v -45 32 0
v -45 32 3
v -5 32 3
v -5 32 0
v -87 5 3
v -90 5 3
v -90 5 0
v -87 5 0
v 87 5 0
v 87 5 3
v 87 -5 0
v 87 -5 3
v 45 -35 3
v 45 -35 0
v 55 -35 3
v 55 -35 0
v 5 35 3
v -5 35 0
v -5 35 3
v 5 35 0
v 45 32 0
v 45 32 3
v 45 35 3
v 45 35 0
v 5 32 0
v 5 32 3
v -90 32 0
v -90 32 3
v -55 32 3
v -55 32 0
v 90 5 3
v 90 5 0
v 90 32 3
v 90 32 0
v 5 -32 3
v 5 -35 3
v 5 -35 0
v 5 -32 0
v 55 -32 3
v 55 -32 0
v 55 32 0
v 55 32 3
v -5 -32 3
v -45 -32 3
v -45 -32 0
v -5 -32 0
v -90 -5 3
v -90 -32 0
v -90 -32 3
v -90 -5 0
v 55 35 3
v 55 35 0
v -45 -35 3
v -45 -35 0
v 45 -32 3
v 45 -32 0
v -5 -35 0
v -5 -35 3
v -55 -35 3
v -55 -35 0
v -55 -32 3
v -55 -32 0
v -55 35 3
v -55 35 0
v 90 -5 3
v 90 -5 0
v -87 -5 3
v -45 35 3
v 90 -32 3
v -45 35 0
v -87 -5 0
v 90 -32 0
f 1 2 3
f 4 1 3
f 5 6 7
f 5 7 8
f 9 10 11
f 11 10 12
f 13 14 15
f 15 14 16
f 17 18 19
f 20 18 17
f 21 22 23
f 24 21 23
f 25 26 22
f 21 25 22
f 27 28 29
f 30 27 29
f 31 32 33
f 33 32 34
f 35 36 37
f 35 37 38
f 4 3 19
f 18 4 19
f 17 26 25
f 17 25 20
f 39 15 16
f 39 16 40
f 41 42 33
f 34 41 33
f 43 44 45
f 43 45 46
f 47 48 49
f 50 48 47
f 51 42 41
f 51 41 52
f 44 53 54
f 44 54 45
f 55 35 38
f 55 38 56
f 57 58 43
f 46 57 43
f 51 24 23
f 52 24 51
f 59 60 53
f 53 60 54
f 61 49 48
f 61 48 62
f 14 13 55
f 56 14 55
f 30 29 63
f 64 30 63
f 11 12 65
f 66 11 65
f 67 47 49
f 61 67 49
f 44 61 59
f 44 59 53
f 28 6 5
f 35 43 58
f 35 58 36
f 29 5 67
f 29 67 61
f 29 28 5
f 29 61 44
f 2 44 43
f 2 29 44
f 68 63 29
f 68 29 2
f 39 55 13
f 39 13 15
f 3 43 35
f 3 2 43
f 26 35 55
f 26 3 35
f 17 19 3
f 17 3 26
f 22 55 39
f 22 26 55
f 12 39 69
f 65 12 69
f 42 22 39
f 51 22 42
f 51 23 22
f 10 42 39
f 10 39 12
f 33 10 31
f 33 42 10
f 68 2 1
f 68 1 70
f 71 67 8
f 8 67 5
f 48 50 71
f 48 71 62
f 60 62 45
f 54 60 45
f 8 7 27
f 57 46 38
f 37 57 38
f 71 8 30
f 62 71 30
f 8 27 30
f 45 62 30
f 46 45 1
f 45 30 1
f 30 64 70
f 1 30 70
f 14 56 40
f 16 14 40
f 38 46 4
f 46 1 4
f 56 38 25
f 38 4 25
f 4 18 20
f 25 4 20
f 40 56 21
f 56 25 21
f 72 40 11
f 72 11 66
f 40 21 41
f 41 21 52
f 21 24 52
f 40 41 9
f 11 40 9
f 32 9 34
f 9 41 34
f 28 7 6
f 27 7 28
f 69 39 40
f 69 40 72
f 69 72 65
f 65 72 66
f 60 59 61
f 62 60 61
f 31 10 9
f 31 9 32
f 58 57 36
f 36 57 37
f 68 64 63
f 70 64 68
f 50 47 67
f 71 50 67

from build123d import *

# Parameters (mm, degrees)
SKETCH3_W           = 180
SKETCH3_H           = 70
BOSS_EXTRUDE1_DEPTH = 3
SKETCH5_W           = 3
SKETCH5_H           = 5
CUT_EXTRUDE2_DEPTH  = 3
SKETCH4_W           = 35
SKETCH4_H           = 3
SKETCH4_W_2         = 40
CUT_EXTRUDE3_DEPTH  = 10


with BuildPart() as part:
    # Sketch3 → Boss-Extrude1 (new body)
    with BuildSketch(Plane.XY):
        Rectangle(SKETCH3_W, SKETCH3_H)
    extrude(amount=BOSS_EXTRUDE1_DEPTH)

    # Sketch5 → Cut-Extrude2 (cut)
    with BuildSketch(Plane.XY.offset(3)):
        with Locations((-88.5, 2.5)):
            Rectangle(SKETCH5_W, SKETCH5_H)
        with Locations((-88.5, -2.5)):
            Rectangle(SKETCH5_W, SKETCH5_H)
        with Locations((88.5, 2.5)):
            Rectangle(SKETCH5_W, SKETCH5_H)
        with Locations((88.5, -2.5)):
            Rectangle(SKETCH5_W, SKETCH5_H)
    extrude(amount=-CUT_EXTRUDE2_DEPTH, mode=Mode.SUBTRACT)

    # Sketch4 → Cut-Extrude3 (cut)
    with BuildSketch(Plane.XY.offset(3)):
        with Locations((-72.5, 33.5)):
            Rectangle(SKETCH4_W, SKETCH4_H)
        with Locations((-25, 33.5)):
            Rectangle(SKETCH4_W_2, SKETCH4_H)
        with Locations((25, 33.5)):
            Rectangle(SKETCH4_W_2, SKETCH4_H)
        with Locations((72.5, 33.5)):
            Rectangle(SKETCH4_W, SKETCH4_H)
        with Locations((72.5, -33.5)):
            Rectangle(SKETCH4_W, SKETCH4_H)
        with Locations((25, -33.5)):
            Rectangle(SKETCH4_W_2, SKETCH4_H)
        with Locations((-25, -33.5)):
            Rectangle(SKETCH4_W_2, SKETCH4_H)
        with Locations((-72.5, -33.5)):
            Rectangle(SKETCH4_W, SKETCH4_H)
    extrude(amount=-CUT_EXTRUDE3_DEPTH, mode=Mode.SUBTRACT)


solid = part.part
